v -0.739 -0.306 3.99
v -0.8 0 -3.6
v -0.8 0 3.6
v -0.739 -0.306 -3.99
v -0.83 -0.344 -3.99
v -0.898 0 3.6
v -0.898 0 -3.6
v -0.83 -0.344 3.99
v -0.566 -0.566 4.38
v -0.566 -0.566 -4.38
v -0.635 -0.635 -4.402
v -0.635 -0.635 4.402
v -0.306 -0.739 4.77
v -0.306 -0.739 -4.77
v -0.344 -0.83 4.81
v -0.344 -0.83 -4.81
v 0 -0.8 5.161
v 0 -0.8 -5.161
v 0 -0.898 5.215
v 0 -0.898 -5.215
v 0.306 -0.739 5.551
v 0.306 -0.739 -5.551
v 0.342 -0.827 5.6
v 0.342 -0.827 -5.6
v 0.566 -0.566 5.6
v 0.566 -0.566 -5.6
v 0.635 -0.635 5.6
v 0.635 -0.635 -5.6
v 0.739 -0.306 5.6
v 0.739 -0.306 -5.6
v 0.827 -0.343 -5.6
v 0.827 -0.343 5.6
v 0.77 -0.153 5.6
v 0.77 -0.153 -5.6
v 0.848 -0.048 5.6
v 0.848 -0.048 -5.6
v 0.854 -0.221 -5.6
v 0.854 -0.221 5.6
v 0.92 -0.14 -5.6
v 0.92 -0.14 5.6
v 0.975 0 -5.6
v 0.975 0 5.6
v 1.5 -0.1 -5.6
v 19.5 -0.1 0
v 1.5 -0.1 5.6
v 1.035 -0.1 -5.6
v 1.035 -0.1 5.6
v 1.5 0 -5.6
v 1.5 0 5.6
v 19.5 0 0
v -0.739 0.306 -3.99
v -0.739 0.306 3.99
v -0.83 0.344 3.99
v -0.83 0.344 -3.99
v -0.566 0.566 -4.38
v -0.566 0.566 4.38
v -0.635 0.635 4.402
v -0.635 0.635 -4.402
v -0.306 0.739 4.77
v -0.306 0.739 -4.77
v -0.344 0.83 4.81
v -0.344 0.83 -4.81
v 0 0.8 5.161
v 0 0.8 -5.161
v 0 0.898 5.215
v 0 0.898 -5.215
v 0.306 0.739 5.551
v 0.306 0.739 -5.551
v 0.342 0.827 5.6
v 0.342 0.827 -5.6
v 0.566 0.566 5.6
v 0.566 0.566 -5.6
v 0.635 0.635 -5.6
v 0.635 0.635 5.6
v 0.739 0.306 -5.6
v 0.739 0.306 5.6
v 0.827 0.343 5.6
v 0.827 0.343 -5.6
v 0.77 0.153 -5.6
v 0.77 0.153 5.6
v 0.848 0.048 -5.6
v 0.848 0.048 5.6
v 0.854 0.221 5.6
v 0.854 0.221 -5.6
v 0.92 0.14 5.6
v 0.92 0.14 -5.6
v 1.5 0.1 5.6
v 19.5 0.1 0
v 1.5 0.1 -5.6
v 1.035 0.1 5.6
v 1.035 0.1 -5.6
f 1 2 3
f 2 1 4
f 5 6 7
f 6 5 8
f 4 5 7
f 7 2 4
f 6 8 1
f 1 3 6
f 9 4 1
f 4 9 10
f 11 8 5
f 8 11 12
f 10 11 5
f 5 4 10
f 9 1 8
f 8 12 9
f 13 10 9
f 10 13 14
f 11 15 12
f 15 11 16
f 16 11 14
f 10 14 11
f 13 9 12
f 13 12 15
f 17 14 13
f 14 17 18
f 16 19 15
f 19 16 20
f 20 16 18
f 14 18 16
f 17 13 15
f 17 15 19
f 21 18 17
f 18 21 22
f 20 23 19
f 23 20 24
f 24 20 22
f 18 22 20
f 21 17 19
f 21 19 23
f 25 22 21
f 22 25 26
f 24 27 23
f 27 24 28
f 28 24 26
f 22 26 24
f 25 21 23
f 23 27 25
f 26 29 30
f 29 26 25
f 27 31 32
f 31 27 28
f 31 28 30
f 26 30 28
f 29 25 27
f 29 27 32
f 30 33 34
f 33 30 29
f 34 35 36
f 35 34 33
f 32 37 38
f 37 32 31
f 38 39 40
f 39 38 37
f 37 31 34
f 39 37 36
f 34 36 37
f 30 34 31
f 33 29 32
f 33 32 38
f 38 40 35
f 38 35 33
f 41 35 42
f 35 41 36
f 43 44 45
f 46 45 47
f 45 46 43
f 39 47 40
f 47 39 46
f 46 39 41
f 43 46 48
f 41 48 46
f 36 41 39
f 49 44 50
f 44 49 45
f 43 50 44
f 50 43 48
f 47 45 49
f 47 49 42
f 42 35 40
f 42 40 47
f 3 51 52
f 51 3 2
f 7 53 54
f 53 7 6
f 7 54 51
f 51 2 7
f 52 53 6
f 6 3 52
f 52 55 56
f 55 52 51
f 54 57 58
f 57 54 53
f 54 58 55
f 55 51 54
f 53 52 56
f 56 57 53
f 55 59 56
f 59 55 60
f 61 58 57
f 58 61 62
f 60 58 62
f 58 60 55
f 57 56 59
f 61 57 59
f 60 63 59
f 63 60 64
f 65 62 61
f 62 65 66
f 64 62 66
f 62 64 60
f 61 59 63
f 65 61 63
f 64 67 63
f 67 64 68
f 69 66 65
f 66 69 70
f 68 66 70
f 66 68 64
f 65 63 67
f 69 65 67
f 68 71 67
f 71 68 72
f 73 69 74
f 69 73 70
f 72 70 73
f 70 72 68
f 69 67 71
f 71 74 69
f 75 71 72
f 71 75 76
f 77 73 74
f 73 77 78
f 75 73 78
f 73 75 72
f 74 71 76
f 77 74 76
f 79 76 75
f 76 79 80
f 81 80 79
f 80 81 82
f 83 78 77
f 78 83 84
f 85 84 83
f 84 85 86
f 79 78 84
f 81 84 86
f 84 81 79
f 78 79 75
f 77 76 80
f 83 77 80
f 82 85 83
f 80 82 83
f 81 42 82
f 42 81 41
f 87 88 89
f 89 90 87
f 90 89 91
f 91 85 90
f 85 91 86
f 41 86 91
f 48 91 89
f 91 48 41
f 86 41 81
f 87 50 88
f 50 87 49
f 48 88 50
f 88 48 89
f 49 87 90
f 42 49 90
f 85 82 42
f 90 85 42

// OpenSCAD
use <../lib.scad>
use <s/165395fc01s01.scad>
function ldraw_lib__165395fc01() = [
// 0 Sticker  1.4 x  5.3 Cutout Rhombus with Yellow Top (Formed)
// 0 Name: 165395fc01.dat
// 0 Author: Takeshi Takahashi [RainbowDolphin]
// 0 !LDRAW_ORG Part UPDATE 2024-04
// 0 !LICENSE Licensed under CC BY 4.0 : see CAreadme.txt
// 
// 0 BFC CERTIFY CCW
  [0,"BFC","CERTIFY"],
  [0,"BFC","CCW"],
// 
// 0 !KEYWORDS Bricklink 6551stk01, Brickowl 930700, Flag, race car
// 0 !KEYWORDS Rebrickable 165395, Set 6551
// 
// 0 !HISTORY 2024-05-28 [OrionP] Official Update 2024-04
// 
// 1 16 0 0 0 1 0 0 0 1 0 0 0 1 s\165395fc01s01.dat
  [1,16,0,0,0,1,0,0,0,1,0,0,0,1, ldraw_lib__s__165395fc01s01()],
// 1 16 0 0 0 1 0 0 0 1 0 0 0 -1 s\165395fc01s01.dat
  [1,16,0,0,0,1,0,0,0,1,0,0,0,-1, ldraw_lib__s__165395fc01s01()],
// 5 24 -2 9 0 -2 -9 0 -1.8478 -9.4877 -0.7654 -1.8478 9.4877 0.7654
  [5,24,-2,9,0,-2,-9,0,-1.8478,-9.4877,-0.7654,-1.8478,9.4877,0.7654],
// 5 24 -2.2452 -9 0 -2.2452 9 0 -2.0744 9.4877 -0.8593 -2.0744 9.4877 0.8593
  [5,24,-2.2452,-9,0,-2.2452,9,0,-2.0744,9.4877,-0.8593,-2.0744,9.4877,0.8593],
// 2 24 -2.2452 9 0 -2 9 0
  [2,24,-2.2452,9,0,-2,9,0],
// 2 24 -2 -9 0 -2.2452 -9 0
  [2,24,-2,-9,0,-2.2452,-9,0],
// 2 24 48.75 0 0 3.75 14 0
  [2,24,48.75,0,0,3.75,14,0],
// 2 24 3.75 -14 0 48.75 0 0
  [2,24,3.75,-14,0,48.75,0,0],
// 2 24 3.75 -14 0 2.4375 -14 0
  [2,24,3.75,-14,0,2.4375,-14,0],
// 2 24 2.4375 14 0 3.75 14 0
  [2,24,2.4375,14,0,3.75,14,0],
];
module ldraw_lib__165395fc01(step=0, col=false, unit=2/5, alt=false, line=0.2, solid=!$preview)
    makepoly(ldraw_lib__165395fc01(), step=step, col=col, unit=unit, alt=alt, line=line, solid=solid);
ldraw_lib__165395fc01(line=0.2);
